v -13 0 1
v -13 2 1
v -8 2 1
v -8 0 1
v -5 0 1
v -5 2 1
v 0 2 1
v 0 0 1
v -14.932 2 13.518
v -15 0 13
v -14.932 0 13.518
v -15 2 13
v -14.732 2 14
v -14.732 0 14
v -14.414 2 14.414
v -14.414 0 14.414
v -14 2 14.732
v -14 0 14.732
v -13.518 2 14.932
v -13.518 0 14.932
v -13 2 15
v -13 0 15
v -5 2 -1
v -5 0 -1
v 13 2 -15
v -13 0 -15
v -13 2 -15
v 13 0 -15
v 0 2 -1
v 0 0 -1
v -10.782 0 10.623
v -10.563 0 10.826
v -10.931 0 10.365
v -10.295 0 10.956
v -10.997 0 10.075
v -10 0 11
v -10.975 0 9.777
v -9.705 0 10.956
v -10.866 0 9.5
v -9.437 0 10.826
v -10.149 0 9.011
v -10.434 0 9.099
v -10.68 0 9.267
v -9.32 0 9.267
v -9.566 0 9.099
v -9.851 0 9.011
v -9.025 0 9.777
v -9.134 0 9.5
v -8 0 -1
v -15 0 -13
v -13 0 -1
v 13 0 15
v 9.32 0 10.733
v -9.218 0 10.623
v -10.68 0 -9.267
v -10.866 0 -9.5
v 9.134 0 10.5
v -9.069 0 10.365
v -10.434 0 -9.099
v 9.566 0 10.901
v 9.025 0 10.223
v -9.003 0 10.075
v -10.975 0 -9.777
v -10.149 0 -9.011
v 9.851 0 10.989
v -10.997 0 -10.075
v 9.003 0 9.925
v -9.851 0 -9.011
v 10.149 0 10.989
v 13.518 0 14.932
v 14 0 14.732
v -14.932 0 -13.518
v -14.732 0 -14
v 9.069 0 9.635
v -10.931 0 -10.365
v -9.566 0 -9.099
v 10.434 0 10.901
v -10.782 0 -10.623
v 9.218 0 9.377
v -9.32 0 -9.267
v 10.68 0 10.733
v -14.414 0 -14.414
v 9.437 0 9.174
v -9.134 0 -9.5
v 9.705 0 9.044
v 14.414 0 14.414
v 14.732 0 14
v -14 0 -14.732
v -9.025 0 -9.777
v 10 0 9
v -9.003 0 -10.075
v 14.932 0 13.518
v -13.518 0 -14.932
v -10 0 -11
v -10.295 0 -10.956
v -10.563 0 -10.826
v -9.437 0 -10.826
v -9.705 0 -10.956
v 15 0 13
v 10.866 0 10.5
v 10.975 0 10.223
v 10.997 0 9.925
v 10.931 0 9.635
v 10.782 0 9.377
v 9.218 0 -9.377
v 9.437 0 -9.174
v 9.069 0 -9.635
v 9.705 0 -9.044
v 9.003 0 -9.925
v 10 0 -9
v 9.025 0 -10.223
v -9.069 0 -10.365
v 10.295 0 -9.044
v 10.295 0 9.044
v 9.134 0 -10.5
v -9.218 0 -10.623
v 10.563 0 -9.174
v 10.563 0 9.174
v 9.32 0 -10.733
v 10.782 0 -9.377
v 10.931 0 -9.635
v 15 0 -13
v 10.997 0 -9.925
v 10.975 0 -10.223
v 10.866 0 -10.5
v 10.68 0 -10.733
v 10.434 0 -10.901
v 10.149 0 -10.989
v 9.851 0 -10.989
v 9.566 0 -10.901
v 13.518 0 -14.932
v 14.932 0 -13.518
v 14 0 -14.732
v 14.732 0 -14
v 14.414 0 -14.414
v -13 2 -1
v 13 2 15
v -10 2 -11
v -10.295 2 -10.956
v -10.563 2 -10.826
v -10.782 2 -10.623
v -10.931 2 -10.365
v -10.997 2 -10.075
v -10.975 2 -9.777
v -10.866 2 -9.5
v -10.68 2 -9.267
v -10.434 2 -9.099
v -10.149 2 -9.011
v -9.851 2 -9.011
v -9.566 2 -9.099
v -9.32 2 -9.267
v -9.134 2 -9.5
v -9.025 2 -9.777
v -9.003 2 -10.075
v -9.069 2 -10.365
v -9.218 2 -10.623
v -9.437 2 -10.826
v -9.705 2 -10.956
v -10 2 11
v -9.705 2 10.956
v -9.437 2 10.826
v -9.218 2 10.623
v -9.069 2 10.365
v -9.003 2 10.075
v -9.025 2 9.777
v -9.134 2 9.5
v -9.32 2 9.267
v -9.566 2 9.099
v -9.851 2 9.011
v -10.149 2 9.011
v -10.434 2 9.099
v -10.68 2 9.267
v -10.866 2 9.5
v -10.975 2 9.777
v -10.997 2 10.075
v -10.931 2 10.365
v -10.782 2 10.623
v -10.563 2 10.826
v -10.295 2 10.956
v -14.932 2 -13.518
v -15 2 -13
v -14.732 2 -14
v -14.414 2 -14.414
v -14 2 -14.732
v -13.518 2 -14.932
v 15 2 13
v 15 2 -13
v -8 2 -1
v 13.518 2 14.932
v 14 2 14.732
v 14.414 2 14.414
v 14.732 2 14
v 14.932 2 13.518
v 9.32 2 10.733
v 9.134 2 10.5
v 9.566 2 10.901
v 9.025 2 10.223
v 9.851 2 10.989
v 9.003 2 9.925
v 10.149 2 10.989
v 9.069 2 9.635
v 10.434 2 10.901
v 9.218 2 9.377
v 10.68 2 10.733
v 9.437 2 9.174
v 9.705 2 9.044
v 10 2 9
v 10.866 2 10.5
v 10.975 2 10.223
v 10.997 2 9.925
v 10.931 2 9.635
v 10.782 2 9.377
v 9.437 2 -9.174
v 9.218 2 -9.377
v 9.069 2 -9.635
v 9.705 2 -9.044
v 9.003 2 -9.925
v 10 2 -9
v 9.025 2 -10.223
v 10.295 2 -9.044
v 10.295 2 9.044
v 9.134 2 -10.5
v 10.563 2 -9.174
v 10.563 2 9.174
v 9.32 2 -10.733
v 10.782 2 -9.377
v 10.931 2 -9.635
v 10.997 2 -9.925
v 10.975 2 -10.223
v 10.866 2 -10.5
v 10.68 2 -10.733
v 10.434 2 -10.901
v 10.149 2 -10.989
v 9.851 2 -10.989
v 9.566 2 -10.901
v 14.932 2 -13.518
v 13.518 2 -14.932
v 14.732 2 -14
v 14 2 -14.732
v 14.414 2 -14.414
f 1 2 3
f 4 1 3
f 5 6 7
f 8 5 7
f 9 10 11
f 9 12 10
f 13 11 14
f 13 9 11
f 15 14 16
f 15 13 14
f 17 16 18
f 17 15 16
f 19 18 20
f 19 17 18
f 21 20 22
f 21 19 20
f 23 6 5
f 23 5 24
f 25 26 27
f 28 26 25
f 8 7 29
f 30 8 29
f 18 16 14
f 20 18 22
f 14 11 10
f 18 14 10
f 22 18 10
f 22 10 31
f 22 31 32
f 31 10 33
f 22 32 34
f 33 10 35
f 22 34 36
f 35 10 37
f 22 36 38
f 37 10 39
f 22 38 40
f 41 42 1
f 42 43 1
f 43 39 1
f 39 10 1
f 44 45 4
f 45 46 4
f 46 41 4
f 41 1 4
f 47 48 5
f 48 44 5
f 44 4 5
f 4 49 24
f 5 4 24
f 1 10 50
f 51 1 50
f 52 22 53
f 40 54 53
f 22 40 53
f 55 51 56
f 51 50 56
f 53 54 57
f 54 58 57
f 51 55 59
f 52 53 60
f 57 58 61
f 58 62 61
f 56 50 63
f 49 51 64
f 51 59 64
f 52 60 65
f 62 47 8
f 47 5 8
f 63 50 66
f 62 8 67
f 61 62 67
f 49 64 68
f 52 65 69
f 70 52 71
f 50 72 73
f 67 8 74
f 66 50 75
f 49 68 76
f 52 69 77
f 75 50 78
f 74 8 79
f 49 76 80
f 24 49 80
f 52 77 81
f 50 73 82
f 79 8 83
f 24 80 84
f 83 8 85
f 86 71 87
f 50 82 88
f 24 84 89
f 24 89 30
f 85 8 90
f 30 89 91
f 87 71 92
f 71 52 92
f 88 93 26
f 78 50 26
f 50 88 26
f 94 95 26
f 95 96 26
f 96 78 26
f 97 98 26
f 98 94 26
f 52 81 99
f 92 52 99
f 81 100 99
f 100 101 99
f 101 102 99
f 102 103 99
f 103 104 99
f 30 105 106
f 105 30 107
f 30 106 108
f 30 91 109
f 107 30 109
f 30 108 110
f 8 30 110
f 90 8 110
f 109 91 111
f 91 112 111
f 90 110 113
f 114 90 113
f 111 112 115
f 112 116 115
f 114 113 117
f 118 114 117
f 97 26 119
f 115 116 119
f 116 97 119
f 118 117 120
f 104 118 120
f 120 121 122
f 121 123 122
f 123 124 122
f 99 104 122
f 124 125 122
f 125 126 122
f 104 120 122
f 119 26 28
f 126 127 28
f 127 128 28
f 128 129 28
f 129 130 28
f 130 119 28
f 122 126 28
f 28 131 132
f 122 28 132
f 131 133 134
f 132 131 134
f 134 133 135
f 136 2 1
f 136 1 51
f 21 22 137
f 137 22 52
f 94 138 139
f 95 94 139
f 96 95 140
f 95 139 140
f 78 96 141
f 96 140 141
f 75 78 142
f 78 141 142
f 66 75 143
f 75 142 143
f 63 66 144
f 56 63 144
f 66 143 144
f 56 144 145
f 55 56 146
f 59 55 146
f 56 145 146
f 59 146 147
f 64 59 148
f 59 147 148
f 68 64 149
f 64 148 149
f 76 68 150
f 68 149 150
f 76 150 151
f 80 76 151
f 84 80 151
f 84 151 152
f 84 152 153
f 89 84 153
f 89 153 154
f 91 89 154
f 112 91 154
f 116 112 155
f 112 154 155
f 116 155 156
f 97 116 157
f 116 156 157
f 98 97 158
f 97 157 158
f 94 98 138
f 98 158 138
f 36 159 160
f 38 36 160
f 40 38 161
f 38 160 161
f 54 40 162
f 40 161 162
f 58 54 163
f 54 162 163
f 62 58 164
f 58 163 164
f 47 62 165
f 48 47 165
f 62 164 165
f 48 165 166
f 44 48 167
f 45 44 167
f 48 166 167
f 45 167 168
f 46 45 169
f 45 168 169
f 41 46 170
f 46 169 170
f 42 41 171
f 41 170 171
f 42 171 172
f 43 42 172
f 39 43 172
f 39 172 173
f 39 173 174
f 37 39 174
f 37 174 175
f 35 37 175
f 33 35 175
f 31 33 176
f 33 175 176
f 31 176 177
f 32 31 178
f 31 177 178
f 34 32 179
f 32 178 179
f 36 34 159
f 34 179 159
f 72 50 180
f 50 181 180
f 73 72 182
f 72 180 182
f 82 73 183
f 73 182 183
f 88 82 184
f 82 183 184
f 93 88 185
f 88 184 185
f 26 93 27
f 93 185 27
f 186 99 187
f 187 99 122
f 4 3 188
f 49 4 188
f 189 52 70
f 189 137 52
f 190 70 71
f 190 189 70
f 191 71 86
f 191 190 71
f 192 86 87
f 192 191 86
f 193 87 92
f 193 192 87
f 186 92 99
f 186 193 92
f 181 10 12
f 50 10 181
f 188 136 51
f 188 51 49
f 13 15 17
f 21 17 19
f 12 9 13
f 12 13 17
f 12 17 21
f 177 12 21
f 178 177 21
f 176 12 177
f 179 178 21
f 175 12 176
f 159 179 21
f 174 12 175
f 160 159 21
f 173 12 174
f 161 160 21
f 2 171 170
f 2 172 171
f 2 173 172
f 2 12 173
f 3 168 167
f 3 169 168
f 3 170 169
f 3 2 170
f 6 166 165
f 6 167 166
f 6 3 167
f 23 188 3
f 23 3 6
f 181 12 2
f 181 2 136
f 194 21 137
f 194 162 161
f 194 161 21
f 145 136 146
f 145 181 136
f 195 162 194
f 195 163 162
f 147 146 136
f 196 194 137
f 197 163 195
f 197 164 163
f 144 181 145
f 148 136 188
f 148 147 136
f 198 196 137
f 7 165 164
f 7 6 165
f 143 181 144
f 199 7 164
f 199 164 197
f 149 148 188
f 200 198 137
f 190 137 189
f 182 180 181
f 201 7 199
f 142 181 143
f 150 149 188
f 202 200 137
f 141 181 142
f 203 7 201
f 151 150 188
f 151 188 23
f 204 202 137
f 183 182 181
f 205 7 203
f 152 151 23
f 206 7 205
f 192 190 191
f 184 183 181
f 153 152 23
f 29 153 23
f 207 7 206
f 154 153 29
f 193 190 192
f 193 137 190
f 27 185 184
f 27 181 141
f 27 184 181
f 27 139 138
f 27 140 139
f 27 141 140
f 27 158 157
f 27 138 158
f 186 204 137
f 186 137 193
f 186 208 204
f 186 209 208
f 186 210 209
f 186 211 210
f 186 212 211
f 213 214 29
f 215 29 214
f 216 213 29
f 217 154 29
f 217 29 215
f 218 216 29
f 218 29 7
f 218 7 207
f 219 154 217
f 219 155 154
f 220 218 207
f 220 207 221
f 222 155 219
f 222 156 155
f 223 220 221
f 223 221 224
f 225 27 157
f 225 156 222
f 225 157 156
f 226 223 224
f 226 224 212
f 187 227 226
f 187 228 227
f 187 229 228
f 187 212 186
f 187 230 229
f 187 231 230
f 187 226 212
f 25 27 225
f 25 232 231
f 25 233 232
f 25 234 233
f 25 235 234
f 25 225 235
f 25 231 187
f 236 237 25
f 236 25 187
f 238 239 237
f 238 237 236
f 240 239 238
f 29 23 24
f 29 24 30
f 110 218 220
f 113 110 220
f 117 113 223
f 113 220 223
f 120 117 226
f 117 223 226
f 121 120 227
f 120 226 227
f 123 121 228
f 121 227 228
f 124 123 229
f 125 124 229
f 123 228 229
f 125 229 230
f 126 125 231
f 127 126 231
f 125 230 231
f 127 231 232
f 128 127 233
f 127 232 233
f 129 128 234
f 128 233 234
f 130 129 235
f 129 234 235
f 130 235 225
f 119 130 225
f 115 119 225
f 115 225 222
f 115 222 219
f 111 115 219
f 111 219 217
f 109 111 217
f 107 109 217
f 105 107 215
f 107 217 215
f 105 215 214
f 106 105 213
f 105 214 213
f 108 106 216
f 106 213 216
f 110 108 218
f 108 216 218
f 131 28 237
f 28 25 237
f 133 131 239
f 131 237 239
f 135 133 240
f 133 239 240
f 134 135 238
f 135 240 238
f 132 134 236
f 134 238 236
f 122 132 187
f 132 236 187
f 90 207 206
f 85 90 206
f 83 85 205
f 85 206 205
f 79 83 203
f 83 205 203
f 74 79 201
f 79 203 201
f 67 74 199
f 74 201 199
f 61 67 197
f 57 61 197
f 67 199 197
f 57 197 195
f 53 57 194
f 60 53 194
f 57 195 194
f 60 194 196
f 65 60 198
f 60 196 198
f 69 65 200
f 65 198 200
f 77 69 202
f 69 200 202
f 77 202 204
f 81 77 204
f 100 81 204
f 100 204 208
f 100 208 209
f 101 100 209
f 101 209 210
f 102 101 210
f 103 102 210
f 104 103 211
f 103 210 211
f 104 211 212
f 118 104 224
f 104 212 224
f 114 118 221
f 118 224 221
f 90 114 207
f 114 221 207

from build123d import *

# Parameters (mm, degrees)
SKETCH1_W           = 30
SKETCH1_H           = 30
BOSS_EXTRUDE1_DEPTH = 2
SKETCH2_R           = 1
SKETCH2_W           = 5
SKETCH2_H           = 2
CUT_EXTRUDE1_DEPTH  = 2
FILLET2_R           = 2


with BuildPart() as part:
    # Sketch1 → Boss-Extrude1 (new body)
    with BuildSketch(Plane(origin=(0, 0, 0), x_dir=(1, 0, 0), z_dir=(0, 1, 0))):
        Rectangle(SKETCH1_W, SKETCH1_H)
    extrude(amount=BOSS_EXTRUDE1_DEPTH)

    # Sketch2 → Cut-Extrude1 (cut)
    with BuildSketch(Plane(origin=(0, 2, 0), x_dir=(1, 0, 0), z_dir=(0, 1, 0))):
        with Locations(Location((10, 10, 0), (0, 0, 270))):
            Circle(SKETCH2_R)
        with Locations(Location((10, -10, 0), (0, 0, 90))):
            Circle(SKETCH2_R)
        with Locations(Location((-10, -10, 0), (0, 0, 270))):
            Circle(SKETCH2_R)
        with Locations(Location((-10, 10, 0), (0, 0, 90))):
            Circle(SKETCH2_R)
        with Locations((-2.5, 0)):
            Rectangle(SKETCH2_W, SKETCH2_H)
        with Locations((-10.5, 0)):
            Rectangle(SKETCH2_W, SKETCH2_H)
    extrude(amount=-CUT_EXTRUDE1_DEPTH, mode=Mode.SUBTRACT)

    # Fillet2
    fillet2_edges = [part.edges().sort_by_distance(p)[0] for p in [
        (-15, 1, -15),
        (15, 1, -15),
        (15, 1, 15),
        (-15, 1, 15),
    ]]
    fillet(fillet2_edges, radius=FILLET2_R)


solid = part.part
